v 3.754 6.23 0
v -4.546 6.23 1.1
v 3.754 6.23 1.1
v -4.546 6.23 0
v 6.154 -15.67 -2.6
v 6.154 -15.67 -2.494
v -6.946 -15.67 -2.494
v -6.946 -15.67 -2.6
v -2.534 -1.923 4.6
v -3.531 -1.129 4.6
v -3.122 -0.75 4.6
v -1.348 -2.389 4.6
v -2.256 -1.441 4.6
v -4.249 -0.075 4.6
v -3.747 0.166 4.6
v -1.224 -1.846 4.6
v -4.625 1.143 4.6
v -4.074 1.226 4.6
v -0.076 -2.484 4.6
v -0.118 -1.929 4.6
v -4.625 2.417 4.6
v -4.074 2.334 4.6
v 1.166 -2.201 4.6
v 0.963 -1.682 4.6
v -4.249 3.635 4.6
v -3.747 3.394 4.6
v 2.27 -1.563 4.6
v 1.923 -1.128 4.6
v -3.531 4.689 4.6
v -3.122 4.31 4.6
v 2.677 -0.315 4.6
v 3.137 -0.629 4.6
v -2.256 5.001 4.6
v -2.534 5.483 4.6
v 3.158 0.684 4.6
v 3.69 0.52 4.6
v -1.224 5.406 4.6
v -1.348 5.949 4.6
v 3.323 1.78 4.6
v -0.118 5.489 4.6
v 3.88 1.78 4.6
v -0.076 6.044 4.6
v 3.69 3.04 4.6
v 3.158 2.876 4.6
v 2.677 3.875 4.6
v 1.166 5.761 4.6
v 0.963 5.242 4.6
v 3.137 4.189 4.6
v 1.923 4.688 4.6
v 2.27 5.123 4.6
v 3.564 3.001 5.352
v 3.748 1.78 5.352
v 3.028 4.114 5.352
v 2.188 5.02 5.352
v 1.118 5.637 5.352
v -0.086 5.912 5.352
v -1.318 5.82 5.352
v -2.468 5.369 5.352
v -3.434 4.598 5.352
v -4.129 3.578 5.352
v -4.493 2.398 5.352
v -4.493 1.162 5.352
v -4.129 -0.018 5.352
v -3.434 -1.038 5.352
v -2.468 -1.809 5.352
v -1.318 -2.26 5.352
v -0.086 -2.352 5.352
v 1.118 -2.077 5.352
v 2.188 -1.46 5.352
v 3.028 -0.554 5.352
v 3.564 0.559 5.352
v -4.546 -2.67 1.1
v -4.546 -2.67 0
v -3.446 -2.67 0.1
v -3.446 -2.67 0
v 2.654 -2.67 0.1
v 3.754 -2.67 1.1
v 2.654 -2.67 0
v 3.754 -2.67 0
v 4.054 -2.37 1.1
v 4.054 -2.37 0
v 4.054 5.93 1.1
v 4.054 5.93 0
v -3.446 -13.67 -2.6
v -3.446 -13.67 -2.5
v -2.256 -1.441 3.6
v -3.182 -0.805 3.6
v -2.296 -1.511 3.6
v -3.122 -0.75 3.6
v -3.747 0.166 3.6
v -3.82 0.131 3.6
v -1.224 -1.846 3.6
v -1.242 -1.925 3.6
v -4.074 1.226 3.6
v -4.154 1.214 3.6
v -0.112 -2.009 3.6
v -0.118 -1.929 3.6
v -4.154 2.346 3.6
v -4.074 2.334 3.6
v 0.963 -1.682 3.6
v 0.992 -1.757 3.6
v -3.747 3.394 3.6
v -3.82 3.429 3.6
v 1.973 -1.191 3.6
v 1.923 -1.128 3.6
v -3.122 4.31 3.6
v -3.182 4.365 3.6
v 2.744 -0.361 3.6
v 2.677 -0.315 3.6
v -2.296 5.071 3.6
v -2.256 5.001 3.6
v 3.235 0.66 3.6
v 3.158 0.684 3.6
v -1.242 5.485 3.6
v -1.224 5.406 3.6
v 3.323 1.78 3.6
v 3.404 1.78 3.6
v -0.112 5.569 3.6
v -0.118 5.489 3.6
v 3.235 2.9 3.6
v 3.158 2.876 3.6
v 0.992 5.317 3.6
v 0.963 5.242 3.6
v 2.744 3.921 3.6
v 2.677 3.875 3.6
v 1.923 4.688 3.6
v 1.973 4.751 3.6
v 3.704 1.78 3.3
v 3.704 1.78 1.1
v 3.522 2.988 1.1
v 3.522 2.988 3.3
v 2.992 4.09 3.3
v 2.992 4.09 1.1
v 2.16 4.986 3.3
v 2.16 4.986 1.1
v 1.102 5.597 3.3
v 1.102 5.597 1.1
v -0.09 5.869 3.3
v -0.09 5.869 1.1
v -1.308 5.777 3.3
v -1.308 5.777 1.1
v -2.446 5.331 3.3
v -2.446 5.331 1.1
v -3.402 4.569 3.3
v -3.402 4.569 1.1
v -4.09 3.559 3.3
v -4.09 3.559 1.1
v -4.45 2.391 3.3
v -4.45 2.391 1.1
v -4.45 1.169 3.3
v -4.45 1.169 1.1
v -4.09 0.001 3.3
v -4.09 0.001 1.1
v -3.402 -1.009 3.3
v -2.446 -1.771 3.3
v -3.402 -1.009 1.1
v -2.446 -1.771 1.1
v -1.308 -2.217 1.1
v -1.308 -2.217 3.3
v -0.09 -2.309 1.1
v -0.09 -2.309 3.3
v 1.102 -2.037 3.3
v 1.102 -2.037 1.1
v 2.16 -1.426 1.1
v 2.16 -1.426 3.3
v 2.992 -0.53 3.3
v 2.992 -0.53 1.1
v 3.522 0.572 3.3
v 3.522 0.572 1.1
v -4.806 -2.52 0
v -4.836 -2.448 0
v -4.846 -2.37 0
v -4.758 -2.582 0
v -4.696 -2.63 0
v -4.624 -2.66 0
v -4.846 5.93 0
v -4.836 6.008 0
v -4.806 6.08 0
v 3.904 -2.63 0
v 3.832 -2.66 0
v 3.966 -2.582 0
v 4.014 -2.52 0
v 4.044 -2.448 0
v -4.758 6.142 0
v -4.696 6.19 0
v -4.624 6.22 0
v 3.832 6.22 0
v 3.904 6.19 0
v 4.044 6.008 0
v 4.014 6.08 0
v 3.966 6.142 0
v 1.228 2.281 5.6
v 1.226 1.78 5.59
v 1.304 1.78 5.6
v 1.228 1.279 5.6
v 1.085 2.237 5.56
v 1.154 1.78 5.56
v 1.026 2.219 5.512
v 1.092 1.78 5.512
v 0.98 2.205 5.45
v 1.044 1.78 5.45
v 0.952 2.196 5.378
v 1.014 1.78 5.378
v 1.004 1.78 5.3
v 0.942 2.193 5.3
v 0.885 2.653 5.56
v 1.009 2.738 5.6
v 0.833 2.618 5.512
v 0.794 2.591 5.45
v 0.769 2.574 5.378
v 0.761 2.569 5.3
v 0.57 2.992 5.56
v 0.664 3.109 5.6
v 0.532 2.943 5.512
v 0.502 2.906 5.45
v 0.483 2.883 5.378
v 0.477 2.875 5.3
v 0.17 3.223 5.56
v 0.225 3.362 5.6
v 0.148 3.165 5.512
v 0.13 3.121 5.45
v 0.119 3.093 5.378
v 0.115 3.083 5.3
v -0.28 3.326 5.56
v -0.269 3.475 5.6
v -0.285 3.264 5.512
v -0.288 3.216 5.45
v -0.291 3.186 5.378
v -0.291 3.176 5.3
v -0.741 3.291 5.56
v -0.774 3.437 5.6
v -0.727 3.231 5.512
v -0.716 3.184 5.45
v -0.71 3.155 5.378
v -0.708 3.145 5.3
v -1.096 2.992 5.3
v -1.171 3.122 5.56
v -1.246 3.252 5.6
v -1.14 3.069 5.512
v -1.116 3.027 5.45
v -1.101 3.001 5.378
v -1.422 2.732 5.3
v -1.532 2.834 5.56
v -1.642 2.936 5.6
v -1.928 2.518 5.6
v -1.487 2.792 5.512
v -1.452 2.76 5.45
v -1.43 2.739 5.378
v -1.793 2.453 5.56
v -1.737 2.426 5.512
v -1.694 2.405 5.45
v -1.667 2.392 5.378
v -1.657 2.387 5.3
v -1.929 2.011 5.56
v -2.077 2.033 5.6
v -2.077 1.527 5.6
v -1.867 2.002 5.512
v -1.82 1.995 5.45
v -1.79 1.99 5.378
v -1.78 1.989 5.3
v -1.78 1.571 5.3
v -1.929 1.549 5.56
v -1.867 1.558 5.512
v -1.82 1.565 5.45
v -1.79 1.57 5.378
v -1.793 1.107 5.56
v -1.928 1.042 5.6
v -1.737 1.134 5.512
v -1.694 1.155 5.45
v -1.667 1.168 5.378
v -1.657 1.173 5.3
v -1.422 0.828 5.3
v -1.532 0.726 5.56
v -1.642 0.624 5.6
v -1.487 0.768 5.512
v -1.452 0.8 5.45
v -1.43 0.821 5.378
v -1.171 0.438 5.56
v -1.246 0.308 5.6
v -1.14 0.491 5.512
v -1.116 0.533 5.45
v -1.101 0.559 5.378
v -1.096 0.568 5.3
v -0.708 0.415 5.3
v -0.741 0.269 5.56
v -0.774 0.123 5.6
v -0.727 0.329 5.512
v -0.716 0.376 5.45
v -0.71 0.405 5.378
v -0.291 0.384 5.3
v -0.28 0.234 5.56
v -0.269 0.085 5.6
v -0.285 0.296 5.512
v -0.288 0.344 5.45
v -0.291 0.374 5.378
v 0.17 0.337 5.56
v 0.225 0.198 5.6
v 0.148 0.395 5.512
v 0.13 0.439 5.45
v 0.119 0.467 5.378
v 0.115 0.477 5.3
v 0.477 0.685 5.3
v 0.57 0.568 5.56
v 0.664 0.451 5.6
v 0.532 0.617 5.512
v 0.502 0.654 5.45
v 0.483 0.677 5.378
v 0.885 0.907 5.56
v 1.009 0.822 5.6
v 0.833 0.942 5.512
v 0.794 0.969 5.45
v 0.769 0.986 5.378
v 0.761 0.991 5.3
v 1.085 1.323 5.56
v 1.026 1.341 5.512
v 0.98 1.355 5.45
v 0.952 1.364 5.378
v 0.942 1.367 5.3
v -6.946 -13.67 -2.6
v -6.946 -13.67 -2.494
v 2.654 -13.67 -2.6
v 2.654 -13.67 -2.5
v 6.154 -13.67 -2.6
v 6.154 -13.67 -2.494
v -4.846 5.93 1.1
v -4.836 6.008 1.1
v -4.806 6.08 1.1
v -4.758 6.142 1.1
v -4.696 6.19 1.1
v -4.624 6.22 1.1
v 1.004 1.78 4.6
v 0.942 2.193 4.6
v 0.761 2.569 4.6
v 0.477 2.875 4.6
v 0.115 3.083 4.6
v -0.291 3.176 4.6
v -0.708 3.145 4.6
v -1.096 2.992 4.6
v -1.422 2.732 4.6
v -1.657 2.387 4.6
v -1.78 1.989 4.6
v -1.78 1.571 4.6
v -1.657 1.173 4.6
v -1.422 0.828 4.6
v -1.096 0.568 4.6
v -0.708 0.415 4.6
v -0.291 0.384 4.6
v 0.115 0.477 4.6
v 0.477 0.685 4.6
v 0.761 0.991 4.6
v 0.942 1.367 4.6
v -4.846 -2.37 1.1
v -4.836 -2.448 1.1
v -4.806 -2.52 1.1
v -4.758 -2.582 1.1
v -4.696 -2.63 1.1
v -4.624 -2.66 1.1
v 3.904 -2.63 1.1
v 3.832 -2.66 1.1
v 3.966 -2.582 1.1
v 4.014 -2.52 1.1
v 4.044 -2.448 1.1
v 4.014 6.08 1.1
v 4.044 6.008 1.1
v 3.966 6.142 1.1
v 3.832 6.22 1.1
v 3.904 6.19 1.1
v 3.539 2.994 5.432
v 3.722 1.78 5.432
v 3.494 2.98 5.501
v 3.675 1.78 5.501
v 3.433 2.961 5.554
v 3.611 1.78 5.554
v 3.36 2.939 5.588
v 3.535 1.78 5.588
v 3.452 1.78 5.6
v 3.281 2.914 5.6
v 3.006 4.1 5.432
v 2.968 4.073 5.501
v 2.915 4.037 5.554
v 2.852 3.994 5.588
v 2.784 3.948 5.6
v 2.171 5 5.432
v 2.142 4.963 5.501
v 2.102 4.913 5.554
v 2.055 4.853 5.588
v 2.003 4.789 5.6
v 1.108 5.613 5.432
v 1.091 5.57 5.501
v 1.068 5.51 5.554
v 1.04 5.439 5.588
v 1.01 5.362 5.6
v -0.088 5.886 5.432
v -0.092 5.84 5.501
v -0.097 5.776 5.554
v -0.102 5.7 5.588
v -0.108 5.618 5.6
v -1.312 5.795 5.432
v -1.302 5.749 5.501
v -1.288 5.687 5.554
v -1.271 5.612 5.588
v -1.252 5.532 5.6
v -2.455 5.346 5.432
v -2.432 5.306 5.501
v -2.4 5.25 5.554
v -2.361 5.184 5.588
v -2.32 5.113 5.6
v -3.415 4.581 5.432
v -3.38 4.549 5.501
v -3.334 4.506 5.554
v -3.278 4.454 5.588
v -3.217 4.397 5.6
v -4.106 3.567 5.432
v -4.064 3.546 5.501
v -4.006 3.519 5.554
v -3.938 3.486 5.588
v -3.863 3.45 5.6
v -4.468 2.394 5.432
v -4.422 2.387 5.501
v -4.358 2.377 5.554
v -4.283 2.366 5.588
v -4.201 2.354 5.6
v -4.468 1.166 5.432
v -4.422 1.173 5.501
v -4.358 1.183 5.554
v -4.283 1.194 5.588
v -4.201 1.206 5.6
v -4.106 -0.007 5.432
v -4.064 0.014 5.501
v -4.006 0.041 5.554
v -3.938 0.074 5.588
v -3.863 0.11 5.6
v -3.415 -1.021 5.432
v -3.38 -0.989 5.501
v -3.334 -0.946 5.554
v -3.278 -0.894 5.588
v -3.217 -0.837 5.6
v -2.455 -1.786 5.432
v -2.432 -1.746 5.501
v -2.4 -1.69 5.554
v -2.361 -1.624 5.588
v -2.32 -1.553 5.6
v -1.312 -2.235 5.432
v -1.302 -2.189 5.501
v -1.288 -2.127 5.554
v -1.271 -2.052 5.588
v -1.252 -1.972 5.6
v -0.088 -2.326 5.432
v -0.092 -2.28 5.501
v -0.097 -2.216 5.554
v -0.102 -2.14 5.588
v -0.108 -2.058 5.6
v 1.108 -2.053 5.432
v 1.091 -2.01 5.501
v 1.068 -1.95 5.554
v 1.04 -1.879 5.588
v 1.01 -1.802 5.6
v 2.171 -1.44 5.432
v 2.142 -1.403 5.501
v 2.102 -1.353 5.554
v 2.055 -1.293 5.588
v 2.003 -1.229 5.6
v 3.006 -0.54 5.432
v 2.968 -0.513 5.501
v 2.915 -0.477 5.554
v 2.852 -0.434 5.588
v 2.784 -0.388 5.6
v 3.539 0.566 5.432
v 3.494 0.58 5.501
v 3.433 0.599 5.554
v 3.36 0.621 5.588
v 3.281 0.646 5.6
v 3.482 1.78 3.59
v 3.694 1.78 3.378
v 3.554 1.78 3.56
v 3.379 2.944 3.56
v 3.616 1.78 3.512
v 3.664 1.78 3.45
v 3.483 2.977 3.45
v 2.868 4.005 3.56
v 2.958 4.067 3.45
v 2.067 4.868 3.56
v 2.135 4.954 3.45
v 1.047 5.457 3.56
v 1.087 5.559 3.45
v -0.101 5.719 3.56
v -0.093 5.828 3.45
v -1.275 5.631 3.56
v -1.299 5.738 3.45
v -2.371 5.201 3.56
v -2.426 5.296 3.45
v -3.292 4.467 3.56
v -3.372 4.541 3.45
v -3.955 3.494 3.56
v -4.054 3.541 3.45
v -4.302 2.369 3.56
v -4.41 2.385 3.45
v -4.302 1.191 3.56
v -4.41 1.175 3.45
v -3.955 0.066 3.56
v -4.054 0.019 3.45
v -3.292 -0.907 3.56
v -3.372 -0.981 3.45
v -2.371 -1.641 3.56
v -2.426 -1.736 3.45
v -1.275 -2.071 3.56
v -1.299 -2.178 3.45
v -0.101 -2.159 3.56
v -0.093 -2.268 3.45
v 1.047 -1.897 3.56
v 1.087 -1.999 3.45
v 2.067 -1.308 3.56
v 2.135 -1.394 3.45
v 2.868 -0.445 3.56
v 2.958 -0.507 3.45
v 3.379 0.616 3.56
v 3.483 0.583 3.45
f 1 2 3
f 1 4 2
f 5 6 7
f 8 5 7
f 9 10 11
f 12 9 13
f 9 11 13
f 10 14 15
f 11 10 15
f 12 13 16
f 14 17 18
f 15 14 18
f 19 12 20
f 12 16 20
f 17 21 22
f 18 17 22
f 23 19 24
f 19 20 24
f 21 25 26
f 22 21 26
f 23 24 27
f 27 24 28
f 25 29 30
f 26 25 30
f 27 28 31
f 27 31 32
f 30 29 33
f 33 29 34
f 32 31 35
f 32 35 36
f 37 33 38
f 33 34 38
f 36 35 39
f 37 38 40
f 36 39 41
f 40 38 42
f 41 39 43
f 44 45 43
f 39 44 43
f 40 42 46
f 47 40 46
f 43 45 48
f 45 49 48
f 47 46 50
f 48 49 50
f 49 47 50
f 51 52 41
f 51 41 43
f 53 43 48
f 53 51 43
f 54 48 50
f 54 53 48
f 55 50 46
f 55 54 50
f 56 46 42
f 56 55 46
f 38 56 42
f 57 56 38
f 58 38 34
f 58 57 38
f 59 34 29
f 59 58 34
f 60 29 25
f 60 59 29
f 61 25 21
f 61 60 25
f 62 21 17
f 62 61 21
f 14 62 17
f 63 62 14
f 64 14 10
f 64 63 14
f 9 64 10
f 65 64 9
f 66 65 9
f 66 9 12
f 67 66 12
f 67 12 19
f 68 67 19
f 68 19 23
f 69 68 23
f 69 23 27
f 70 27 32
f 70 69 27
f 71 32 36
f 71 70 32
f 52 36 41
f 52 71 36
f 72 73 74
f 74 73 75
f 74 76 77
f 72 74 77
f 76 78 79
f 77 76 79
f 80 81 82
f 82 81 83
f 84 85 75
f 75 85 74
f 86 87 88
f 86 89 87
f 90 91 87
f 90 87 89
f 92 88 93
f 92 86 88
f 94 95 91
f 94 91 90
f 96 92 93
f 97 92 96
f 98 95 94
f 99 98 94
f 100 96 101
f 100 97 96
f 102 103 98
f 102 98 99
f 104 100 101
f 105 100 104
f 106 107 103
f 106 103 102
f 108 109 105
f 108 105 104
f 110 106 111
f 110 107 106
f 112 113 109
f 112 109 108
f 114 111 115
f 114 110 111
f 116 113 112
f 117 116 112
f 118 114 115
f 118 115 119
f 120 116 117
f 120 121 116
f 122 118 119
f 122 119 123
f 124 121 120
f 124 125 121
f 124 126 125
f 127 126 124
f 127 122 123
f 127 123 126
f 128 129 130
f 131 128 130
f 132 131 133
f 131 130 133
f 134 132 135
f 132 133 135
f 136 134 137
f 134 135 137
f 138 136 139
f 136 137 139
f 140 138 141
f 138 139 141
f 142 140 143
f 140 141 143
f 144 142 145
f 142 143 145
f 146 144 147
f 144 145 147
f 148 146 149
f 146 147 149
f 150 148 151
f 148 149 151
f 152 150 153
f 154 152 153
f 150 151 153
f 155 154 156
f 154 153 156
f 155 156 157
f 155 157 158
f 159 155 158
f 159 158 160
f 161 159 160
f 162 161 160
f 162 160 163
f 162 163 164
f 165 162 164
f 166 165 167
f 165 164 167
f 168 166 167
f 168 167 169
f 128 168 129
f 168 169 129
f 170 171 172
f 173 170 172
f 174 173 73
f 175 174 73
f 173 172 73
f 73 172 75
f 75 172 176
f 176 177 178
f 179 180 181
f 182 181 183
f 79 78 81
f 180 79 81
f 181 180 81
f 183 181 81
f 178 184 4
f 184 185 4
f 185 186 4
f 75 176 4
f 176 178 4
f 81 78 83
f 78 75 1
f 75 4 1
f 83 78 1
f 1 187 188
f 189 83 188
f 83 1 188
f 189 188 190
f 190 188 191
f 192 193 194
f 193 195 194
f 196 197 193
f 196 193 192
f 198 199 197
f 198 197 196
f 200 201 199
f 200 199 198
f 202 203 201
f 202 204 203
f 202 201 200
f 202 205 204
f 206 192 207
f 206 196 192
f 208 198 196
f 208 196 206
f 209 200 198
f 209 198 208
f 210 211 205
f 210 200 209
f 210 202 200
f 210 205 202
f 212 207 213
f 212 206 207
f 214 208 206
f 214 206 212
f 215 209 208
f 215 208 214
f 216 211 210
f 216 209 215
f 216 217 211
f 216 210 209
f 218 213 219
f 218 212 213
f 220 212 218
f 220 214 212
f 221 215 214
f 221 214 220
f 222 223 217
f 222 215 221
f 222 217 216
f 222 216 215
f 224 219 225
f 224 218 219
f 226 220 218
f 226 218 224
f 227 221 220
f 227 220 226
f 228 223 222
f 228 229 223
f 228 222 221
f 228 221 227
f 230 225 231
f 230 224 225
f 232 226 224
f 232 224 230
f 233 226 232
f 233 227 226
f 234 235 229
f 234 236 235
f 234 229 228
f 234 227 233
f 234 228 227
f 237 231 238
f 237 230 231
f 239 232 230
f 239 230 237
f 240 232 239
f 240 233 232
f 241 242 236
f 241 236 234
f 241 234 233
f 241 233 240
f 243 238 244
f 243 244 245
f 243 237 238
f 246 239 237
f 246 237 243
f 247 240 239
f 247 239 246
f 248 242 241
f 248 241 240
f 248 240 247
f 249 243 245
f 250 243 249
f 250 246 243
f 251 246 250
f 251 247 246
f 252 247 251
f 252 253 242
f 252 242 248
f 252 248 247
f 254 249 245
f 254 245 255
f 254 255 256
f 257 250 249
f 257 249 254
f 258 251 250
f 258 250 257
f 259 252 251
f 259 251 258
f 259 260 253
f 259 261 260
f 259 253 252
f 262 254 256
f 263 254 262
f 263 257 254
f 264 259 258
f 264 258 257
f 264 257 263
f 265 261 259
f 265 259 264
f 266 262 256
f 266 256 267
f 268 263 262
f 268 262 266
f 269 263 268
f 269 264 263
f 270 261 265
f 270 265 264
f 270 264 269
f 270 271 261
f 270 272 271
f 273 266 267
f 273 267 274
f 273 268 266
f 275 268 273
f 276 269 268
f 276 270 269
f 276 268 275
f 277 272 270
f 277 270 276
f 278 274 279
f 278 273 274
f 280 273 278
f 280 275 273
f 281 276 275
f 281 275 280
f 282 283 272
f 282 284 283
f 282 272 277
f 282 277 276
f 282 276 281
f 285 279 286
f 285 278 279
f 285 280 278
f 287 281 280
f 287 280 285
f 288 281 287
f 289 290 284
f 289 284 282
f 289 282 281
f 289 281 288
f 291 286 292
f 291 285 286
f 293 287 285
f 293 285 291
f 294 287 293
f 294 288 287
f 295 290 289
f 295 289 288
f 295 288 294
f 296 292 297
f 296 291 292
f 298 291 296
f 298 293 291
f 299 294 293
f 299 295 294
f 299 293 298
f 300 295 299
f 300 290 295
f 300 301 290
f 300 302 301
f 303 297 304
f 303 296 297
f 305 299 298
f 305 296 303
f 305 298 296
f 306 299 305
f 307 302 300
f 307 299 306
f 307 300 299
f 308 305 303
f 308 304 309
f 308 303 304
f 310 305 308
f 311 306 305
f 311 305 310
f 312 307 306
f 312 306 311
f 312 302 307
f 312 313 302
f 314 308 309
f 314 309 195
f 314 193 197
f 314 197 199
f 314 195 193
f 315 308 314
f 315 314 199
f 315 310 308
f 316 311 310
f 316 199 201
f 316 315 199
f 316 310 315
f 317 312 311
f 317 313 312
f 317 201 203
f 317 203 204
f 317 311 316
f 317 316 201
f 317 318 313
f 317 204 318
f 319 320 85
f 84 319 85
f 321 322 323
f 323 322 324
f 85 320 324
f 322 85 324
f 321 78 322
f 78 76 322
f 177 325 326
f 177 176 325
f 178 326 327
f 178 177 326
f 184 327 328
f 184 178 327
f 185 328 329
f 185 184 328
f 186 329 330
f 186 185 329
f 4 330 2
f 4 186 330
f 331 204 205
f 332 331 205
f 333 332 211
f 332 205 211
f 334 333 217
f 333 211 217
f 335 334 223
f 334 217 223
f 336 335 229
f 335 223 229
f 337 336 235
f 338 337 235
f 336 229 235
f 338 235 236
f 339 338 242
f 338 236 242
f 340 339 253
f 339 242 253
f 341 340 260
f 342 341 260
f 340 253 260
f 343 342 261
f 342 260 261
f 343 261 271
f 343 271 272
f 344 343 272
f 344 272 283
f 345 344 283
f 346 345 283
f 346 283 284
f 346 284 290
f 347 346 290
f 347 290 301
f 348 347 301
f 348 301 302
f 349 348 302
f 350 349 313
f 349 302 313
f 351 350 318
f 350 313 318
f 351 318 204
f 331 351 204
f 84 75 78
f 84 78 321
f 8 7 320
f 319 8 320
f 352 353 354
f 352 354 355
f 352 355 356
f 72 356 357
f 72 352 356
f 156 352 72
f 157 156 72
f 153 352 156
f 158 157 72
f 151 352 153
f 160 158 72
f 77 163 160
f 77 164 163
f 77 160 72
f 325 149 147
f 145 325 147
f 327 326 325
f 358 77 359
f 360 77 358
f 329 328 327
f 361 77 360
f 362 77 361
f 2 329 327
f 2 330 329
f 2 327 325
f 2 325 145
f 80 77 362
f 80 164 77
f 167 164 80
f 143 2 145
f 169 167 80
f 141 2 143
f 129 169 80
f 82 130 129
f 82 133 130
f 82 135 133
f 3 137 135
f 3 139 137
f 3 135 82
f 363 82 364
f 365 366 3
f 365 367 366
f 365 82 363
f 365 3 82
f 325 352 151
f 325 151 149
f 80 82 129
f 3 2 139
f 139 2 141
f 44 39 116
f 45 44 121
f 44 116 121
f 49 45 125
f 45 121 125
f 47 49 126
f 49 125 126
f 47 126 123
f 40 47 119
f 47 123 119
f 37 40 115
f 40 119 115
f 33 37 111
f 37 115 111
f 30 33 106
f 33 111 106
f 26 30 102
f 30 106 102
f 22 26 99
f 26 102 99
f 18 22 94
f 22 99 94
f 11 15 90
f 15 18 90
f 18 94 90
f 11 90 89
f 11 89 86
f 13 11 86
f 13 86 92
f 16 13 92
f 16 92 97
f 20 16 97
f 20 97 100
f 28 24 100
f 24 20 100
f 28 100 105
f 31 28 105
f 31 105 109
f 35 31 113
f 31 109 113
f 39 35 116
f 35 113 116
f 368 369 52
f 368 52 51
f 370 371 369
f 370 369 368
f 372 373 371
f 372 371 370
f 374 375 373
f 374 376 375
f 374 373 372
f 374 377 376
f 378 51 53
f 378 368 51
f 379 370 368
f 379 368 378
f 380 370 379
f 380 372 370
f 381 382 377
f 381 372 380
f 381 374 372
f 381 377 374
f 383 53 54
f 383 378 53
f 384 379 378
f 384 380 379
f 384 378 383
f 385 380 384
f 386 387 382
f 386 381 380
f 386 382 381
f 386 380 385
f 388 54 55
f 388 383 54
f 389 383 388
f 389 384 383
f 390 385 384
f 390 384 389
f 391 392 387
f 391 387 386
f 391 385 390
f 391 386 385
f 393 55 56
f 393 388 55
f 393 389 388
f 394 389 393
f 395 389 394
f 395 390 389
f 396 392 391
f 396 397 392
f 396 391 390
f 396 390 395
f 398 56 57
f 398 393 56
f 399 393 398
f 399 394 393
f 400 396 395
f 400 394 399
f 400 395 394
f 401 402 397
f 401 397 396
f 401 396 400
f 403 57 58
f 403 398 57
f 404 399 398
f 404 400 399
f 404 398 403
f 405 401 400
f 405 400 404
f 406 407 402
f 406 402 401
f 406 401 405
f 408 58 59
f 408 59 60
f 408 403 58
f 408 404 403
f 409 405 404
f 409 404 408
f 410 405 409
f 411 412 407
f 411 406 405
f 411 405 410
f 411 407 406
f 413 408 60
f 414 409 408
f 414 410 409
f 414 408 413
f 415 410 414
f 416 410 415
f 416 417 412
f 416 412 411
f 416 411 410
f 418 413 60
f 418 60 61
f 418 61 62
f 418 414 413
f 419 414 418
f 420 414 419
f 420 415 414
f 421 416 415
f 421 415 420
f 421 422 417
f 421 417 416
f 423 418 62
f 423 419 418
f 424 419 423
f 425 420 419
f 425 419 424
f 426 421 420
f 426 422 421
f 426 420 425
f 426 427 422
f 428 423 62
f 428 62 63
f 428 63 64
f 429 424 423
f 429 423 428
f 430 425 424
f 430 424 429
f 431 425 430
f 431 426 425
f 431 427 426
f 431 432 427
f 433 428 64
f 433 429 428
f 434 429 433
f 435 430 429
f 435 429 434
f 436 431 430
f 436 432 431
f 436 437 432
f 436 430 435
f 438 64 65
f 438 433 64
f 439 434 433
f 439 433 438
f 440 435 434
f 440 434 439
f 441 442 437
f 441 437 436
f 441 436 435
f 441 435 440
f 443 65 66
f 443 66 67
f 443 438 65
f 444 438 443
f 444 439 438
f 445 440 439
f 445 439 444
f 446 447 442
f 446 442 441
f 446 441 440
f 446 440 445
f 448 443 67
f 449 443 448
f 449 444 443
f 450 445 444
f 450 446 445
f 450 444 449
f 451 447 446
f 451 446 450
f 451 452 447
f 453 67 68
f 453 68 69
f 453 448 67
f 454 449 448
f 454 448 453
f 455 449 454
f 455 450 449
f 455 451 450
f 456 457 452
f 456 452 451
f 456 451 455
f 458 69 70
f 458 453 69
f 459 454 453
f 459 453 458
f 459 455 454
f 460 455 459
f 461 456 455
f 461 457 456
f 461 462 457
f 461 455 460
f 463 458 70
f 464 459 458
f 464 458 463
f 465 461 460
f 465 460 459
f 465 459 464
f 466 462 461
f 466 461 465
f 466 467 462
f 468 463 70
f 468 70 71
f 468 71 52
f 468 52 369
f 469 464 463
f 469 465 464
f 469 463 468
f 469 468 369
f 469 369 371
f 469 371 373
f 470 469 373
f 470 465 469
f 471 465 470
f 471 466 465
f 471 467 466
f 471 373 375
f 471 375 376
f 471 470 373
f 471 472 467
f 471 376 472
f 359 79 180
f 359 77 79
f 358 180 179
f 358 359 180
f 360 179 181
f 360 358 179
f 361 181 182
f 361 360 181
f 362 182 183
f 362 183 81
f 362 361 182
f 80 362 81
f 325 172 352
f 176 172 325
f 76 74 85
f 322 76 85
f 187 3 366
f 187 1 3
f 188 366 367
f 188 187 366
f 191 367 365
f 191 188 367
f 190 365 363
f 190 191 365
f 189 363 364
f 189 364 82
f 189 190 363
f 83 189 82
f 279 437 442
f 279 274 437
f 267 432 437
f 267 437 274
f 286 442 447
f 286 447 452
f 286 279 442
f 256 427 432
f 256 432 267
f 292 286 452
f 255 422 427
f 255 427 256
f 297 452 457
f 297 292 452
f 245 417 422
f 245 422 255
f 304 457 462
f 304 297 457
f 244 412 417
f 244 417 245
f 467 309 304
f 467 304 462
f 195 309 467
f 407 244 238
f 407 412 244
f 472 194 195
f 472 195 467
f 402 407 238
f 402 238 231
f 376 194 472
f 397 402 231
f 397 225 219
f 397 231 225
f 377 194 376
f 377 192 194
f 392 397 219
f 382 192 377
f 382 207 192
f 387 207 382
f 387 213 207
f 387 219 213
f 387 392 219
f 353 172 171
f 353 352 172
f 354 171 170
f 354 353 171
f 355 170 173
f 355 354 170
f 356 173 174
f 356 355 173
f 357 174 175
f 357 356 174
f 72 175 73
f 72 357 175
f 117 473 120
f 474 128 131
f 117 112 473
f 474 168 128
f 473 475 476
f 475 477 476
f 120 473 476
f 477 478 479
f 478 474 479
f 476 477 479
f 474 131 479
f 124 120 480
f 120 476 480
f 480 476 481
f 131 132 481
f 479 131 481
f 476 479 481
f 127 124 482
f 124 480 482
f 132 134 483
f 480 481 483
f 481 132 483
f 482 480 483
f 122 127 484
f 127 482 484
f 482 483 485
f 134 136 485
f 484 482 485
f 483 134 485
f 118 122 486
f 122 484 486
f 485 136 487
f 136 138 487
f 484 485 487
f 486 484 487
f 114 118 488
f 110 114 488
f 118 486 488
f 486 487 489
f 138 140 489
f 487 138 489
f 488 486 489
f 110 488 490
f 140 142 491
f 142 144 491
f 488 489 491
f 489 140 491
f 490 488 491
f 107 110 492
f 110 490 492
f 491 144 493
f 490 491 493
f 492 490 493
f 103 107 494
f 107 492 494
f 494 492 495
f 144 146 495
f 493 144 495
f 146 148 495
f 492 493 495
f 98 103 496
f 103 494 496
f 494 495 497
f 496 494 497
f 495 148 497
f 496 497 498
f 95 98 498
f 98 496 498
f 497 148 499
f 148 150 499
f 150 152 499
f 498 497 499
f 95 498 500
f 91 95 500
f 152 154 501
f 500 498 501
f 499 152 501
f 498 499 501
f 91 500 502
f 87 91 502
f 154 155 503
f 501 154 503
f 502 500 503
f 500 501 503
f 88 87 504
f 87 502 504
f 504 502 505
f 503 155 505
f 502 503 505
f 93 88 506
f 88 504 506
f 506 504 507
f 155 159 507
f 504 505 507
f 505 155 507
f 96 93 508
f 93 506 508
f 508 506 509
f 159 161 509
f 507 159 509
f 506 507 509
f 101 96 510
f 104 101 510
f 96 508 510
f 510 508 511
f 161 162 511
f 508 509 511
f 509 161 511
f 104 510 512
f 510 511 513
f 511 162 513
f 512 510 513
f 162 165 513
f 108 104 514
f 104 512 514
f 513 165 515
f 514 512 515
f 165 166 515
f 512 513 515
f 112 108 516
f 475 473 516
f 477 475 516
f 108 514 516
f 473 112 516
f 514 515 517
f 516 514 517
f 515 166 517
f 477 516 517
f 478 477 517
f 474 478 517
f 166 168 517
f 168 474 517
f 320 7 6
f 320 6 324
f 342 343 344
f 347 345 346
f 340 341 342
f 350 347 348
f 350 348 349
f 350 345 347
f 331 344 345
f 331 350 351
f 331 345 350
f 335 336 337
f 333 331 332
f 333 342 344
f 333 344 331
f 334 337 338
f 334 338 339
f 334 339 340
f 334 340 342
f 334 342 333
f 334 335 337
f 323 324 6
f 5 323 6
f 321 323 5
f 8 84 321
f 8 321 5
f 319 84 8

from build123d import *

# Parameters (mm, degrees)
EXTRUDE_633_DEPTH    = 0.1
SKETCH_2_W           = 8.9
SKETCH_2_H           = 8.9
EXTRUDE_2_DEPTH      = 1
SKETCH_3_R           = 4.1
EXTRUDE_3_DEPTH      = 2.5
SKETCH_4_R           = 3.719118072
EXTRUDE_4_DEPTH      = 2
SKETCH_5_R           = 4.1
EXTRUDE_5_DEPTH      = 1
EXTRUDE_5_DRAFT      = 10
SKETCH_6_R           = 1.4
CUT_EXTRUDE_1_DEPTH  = 1
FILLET_1_R           = 0.3
FILLET_2_R           = 0.3
FILLET_3_R           = 0.3
EXTRUDE_7_DEPTH      = 2.6
EXTRUDE_7_DEPTH_BACK = 0.1
CUT_EXTRUDE_4_REACH  = 21.211
CUT_EXTRUDE_5_REACH  = 23.178
SKETCH_13_W          = 2.594072948
SKETCH_13_H          = 2


with BuildPart() as part:
    # 草图1 → Extrude 633 (new body)
    with BuildSketch(Plane.XY):
        Polygon((2.653989215, -2.67), (4.053989215, -2.67), (4.053989215, 6.23), (-4.846010785, 6.23), (-4.846010785, -2.67), (-3.446010785, -2.67), (-3.446010785, -13.67), (-6.946010785, -13.67), (-6.946010785, -15.67), (6.153989215, -15.67), (6.153989215, -13.67), (2.653989215, -13.67), align=None)
    extrude(amount=EXTRUDE_633_DEPTH)

    # 草图2 → 凸台-拉伸2 (add)
    with BuildSketch(Plane.XY.offset(0.1)):
        with Locations((-0.396010785, 1.78)):
            Rectangle(SKETCH_2_W, SKETCH_2_H)
    extrude(amount=EXTRUDE_2_DEPTH)

    # 草图3 → 凸台-拉伸3 (add)
    with BuildSketch(Plane.XY.offset(1.1)):
        with Locations((-0.396010785, 1.78)):
            Circle(SKETCH_3_R)
    extrude(amount=EXTRUDE_3_DEPTH)

    # 草图4 → 凸台-拉伸4 (add)
    with BuildSketch(Plane.XY.offset(3.6)):
        with Locations((-0.396010785, 1.78)):
            Circle(SKETCH_4_R)
    extrude(amount=EXTRUDE_4_DEPTH)


with BuildPart() as extrude_5_tool:
    # 草图5 → 凸台-拉伸5 (with draft: the straight prism first)
    with BuildSketch(Plane.XY.offset(5.6)):
        with Locations((-0.396010785, 1.78)):
            Circle(SKETCH_5_R)
    extrude(amount=-EXTRUDE_5_DEPTH)
    # 凸台-拉伸5: the draft: its side faces are tilted about the plane it starts from
    extrude_5_sides = [extrude_5_tool.faces().sort_by_distance(p)[0] for p in [
        (-4.496010785, 1.78, 5.1),
    ]]
    draft(extrude_5_sides, Plane.XY.offset(5.6), EXTRUDE_5_DRAFT)


with BuildPart() as part_1:
    add(part.part)

    # 凸台-拉伸5: add extrude_5_tool
    add(extrude_5_tool.part)

    # 草图6 → 切除-拉伸1 (cut)
    with BuildSketch(Plane.XY.offset(5.6)):
        with Locations((-0.396010785, 1.78)):
            Circle(SKETCH_6_R)
    extrude(amount=-CUT_EXTRUDE_1_DEPTH, mode=Mode.SUBTRACT)

    # 圆角1
    fillet_1_edges = [part_1.edges().sort_by_distance(p)[0] for p in [
        (-4.496010785, 1.78, 3.6),
        (-4.496010785, 1.78, 5.6),
    ]]
    fillet(fillet_1_edges, radius=FILLET_1_R)

    # 圆角2
    fillet_2_edges = [part_1.edges().sort_by_distance(p)[0] for p in [
        (-4.846010785, 6.23, 0.55),
        (4.053989215, 6.23, 0.55),
        (4.053989215, -2.67, 0.55),
        (-4.846010785, -2.67, 0.55),
    ]]
    fillet(fillet_2_edges, radius=FILLET_2_R)

    # 圆角3
    fillet_3_edges = [part_1.edges().sort_by_distance(p)[0] for p in [
        (-1.796010785, 1.78, 5.6),
    ]]
    fillet(fillet_3_edges, radius=FILLET_3_R)

    # 草图11 → 凸台-拉伸7 (add, two sides: drawn at the far end of the back side and taken through both)
    with BuildSketch(Plane(origin=(0, 0, 0), x_dir=(-1, 0, 0), z_dir=(0, 0, -1)).offset(-EXTRUDE_7_DEPTH_BACK)):
        Polygon((-2.653989215, -13.67), (-6.153989215, -13.67), (-6.153989215, -15.67), (6.946010785, -15.67), (6.946010785, -13.67), (3.446010785, -13.67), (3.446010785, -2.67), (-2.653989215, -2.67), align=None)
    extrude(amount=EXTRUDE_7_DEPTH + EXTRUDE_7_DEPTH_BACK)

    # 草图12 → 切除-拉伸4 (cut, up to next)
    with BuildSketch(Plane.ZY.offset(3.446010785), mode=Mode.PRIVATE) as cut_extrude_4_sk1:
        Polygon((0, -2.67), (-2.6, -13.67), (-2.6, -2.67), align=None)
    cut_extrude_4_tool1 = extrude(cut_extrude_4_sk1.sketch, amount=-CUT_EXTRUDE_4_REACH, mode=Mode.PRIVATE) & part_1.part
    # 草图12 → 切除-拉伸4 (cut, up to next)
    with BuildSketch(Plane.ZY.offset(3.446010785), mode=Mode.PRIVATE) as cut_extrude_4_sk2:
        Polygon((0.1, -2.67), (-2.5, -13.67), (0.1, -13.67), align=None)
    cut_extrude_4_tool2 = extrude(cut_extrude_4_sk2.sketch, amount=-CUT_EXTRUDE_4_REACH, mode=Mode.PRIVATE) & part_1.part
    add(cut_extrude_4_tool1.solids().sort_by_distance((-3.446011, -6.336667, -1.733333))[0], mode=Mode.SUBTRACT)
    add(cut_extrude_4_tool2.solids().sort_by_distance((-3.446011, -10.003333, -0.766667))[0], mode=Mode.SUBTRACT)

    # 草图13 → 切除-拉伸5 (cut, up to next)
    with BuildSketch(Plane.ZY.offset(6.946010785), mode=Mode.PRIVATE) as cut_extrude_5_sk1:
        with Locations((-1.197036474, -14.67)):
            Rectangle(SKETCH_13_W, SKETCH_13_H)
    cut_extrude_5_tool1 = extrude(cut_extrude_5_sk1.sketch, amount=-CUT_EXTRUDE_5_REACH, mode=Mode.PRIVATE) & part_1.part
    add(cut_extrude_5_tool1.solids().sort_by_distance((-6.946011, -14.67, -1.197036))[0], mode=Mode.SUBTRACT)


solid = part_1.part
